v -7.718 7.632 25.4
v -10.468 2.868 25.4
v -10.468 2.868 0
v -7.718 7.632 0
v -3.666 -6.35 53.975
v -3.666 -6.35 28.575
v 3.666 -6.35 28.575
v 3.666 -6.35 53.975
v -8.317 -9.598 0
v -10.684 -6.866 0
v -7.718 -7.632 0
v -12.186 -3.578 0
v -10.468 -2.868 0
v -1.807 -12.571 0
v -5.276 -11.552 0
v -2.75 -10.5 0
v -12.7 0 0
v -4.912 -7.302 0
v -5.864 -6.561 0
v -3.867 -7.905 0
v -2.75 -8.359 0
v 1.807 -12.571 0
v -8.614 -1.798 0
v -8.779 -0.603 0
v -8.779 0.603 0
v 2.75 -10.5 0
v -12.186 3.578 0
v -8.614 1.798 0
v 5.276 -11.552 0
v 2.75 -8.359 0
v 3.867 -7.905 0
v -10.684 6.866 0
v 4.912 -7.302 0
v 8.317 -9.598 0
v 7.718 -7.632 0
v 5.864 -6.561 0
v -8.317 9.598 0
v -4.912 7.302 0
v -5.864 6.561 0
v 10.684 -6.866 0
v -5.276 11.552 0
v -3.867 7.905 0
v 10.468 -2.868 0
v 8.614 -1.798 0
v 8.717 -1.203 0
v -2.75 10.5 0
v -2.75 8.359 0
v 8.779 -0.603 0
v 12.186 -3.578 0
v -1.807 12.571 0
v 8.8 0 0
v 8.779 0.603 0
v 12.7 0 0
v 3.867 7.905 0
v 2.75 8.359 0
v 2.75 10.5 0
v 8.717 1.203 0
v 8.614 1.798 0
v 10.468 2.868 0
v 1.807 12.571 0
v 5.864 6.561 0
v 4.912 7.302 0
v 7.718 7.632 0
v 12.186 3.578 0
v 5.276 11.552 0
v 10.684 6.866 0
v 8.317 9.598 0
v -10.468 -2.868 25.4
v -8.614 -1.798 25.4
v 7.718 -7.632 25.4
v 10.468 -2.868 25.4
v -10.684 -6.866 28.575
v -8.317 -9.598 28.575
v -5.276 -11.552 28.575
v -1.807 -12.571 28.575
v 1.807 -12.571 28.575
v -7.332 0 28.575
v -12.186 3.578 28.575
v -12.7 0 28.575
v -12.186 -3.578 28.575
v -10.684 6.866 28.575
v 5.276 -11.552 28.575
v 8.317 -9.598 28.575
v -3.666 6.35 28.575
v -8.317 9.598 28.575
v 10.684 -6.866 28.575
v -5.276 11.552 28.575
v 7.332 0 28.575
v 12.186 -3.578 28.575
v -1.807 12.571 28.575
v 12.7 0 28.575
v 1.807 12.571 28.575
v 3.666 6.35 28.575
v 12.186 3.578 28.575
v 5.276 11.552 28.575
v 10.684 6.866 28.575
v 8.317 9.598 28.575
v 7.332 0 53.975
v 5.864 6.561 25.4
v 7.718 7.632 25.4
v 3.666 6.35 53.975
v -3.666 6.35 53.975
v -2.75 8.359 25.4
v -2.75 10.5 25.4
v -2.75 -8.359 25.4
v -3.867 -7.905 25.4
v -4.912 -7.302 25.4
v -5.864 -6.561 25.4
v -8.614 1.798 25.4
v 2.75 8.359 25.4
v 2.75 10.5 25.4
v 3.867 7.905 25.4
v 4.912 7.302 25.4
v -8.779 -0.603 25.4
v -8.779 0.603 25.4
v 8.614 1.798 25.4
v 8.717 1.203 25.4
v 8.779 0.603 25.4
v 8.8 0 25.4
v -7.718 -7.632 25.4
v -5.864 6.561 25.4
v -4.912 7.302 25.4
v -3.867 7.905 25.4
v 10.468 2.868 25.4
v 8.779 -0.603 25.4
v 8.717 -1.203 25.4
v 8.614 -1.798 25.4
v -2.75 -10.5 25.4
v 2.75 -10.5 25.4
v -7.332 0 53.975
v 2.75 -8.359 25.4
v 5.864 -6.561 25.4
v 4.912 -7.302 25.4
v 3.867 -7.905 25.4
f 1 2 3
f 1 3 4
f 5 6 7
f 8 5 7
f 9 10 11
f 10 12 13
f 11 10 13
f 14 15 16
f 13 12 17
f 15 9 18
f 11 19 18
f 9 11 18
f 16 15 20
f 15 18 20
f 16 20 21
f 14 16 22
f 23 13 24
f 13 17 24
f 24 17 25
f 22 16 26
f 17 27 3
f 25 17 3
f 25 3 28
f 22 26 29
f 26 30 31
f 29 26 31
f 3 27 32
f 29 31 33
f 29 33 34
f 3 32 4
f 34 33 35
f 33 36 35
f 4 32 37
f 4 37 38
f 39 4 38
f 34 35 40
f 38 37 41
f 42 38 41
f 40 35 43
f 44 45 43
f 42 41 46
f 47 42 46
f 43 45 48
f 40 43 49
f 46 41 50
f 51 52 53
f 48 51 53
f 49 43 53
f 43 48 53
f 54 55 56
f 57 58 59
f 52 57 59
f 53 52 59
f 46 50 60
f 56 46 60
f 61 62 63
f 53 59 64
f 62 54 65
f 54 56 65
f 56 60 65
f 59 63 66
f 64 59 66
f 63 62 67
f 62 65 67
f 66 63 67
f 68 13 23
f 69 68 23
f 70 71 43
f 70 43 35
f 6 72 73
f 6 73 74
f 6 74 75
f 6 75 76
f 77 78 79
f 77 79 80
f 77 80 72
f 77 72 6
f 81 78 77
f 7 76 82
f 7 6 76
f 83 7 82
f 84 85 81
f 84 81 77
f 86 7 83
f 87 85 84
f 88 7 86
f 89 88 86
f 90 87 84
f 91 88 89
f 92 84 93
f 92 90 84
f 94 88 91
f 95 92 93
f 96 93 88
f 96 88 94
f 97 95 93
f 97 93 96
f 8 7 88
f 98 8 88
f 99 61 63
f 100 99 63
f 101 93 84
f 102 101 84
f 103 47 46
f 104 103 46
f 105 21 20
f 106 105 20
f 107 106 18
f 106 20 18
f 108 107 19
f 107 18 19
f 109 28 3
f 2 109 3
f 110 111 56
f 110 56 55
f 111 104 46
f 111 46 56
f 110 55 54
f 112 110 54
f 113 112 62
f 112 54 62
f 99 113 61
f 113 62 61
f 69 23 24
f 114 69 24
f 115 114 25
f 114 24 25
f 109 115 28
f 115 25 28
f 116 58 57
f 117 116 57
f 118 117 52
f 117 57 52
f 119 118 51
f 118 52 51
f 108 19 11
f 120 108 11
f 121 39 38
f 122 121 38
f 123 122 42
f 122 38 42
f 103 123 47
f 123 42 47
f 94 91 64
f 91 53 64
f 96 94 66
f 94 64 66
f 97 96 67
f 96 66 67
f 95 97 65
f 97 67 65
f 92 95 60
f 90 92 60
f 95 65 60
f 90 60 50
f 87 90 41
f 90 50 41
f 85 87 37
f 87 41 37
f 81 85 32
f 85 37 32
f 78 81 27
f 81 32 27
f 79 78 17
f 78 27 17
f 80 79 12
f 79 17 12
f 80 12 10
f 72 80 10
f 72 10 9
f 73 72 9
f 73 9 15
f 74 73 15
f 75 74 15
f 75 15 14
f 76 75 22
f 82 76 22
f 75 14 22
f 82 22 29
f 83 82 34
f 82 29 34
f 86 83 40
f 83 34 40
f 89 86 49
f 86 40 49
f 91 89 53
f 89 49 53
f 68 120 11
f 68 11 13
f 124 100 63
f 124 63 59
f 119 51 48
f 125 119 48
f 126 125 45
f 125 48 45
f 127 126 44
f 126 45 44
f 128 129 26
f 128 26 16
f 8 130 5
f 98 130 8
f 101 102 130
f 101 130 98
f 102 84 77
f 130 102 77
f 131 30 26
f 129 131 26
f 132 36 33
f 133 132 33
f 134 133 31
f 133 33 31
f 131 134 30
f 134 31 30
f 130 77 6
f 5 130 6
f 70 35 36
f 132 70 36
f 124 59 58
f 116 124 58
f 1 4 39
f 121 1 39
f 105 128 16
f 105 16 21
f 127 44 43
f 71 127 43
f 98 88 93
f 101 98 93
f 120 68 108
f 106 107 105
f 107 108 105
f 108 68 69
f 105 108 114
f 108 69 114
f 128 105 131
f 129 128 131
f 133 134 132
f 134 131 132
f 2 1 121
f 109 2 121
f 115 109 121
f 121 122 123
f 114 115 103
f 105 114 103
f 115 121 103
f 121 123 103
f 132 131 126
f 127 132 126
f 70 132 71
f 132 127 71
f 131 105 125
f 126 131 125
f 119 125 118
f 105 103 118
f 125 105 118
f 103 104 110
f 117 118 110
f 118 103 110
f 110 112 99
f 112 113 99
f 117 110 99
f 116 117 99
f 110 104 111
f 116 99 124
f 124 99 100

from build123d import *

# Parameters (mm, degrees)
F0_R     = 12.7
F1_DEPTH = 25.4
F2_R     = 12.7
F3_DEPTH = 3.175
F5_DEPTH = 25.4


with BuildPart() as f1:
    # F0 (on Top) → F1 (new body)
    with BuildSketch(Plane.XY):
        Circle(F0_R)
        with BuildLine():
            ThreePointArc((8.614346, 1.798068), (8.753463, 0.903814), (8.8, 0))
            ThreePointArc((8.8, 0), (8.753463, -0.903814), (8.614346, -1.798068))
            Line((8.614346, -1.798068), (10.468267, -2.86843))
            Line((10.468267, -2.86843), (7.718267, -7.63157))
            Line((7.718267, -7.63157), (5.864346, -6.561208))
            ThreePointArc((5.864346, -6.561208), (4.4, -7.621024), (2.75, -8.359276))
            Line((2.75, -8.359276), (2.75, -10.5))
            Line((2.75, -10.5), (-2.75, -10.5))
            Line((-2.75, -10.5), (-2.75, -8.359276))
            ThreePointArc((-2.75, -8.359276), (-4.4, -7.621024), (-5.864346, -6.561208))
            Line((-5.864346, -6.561208), (-7.718267, -7.63157))
            Line((-7.718267, -7.63157), (-10.468267, -2.86843))
            Line((-10.468267, -2.86843), (-8.614346, -1.798068))
            ThreePointArc((-8.614346, -1.798068), (-8.8, 0), (-8.614346, 1.798068))
            Line((-8.614346, 1.798068), (-10.468267, 2.86843))
            Line((-10.468267, 2.86843), (-7.718267, 7.63157))
            Line((-7.718267, 7.63157), (-5.864346, 6.561208))
            ThreePointArc((-5.864346, 6.561208), (-4.4, 7.621024), (-2.75, 8.359276))
            Line((-2.75, 8.359276), (-2.75, 10.5))
            Line((-2.75, 10.5), (2.75, 10.5))
            Line((2.75, 10.5), (2.75, 8.359276))
            ThreePointArc((2.75, 8.359276), (4.4, 7.621024), (5.864346, 6.561208))
            Line((5.864346, 6.561208), (7.718267, 7.63157))
            Line((7.718267, 7.63157), (10.468267, 2.86843))
            Line((10.468267, 2.86843), (8.614346, 1.798068))
        make_face(mode=Mode.SUBTRACT)
    extrude(amount=F1_DEPTH)

    # F2 (on face) → F3 (join)
    with BuildSketch(Plane.XY.offset(25.4)):
        Circle(F2_R)
    extrude(amount=F3_DEPTH)

    # F4 (on face) → F5 (join)
    with BuildSketch(Plane.XY.offset(28.575)):
        Polygon((3.666174, 6.35), (-3.666174, 6.35), (-7.332348, 0), (-3.666174, -6.35), (3.666174, -6.35), (7.332348, 0), align=None)
    extrude(amount=F5_DEPTH)


solid = f1.part
